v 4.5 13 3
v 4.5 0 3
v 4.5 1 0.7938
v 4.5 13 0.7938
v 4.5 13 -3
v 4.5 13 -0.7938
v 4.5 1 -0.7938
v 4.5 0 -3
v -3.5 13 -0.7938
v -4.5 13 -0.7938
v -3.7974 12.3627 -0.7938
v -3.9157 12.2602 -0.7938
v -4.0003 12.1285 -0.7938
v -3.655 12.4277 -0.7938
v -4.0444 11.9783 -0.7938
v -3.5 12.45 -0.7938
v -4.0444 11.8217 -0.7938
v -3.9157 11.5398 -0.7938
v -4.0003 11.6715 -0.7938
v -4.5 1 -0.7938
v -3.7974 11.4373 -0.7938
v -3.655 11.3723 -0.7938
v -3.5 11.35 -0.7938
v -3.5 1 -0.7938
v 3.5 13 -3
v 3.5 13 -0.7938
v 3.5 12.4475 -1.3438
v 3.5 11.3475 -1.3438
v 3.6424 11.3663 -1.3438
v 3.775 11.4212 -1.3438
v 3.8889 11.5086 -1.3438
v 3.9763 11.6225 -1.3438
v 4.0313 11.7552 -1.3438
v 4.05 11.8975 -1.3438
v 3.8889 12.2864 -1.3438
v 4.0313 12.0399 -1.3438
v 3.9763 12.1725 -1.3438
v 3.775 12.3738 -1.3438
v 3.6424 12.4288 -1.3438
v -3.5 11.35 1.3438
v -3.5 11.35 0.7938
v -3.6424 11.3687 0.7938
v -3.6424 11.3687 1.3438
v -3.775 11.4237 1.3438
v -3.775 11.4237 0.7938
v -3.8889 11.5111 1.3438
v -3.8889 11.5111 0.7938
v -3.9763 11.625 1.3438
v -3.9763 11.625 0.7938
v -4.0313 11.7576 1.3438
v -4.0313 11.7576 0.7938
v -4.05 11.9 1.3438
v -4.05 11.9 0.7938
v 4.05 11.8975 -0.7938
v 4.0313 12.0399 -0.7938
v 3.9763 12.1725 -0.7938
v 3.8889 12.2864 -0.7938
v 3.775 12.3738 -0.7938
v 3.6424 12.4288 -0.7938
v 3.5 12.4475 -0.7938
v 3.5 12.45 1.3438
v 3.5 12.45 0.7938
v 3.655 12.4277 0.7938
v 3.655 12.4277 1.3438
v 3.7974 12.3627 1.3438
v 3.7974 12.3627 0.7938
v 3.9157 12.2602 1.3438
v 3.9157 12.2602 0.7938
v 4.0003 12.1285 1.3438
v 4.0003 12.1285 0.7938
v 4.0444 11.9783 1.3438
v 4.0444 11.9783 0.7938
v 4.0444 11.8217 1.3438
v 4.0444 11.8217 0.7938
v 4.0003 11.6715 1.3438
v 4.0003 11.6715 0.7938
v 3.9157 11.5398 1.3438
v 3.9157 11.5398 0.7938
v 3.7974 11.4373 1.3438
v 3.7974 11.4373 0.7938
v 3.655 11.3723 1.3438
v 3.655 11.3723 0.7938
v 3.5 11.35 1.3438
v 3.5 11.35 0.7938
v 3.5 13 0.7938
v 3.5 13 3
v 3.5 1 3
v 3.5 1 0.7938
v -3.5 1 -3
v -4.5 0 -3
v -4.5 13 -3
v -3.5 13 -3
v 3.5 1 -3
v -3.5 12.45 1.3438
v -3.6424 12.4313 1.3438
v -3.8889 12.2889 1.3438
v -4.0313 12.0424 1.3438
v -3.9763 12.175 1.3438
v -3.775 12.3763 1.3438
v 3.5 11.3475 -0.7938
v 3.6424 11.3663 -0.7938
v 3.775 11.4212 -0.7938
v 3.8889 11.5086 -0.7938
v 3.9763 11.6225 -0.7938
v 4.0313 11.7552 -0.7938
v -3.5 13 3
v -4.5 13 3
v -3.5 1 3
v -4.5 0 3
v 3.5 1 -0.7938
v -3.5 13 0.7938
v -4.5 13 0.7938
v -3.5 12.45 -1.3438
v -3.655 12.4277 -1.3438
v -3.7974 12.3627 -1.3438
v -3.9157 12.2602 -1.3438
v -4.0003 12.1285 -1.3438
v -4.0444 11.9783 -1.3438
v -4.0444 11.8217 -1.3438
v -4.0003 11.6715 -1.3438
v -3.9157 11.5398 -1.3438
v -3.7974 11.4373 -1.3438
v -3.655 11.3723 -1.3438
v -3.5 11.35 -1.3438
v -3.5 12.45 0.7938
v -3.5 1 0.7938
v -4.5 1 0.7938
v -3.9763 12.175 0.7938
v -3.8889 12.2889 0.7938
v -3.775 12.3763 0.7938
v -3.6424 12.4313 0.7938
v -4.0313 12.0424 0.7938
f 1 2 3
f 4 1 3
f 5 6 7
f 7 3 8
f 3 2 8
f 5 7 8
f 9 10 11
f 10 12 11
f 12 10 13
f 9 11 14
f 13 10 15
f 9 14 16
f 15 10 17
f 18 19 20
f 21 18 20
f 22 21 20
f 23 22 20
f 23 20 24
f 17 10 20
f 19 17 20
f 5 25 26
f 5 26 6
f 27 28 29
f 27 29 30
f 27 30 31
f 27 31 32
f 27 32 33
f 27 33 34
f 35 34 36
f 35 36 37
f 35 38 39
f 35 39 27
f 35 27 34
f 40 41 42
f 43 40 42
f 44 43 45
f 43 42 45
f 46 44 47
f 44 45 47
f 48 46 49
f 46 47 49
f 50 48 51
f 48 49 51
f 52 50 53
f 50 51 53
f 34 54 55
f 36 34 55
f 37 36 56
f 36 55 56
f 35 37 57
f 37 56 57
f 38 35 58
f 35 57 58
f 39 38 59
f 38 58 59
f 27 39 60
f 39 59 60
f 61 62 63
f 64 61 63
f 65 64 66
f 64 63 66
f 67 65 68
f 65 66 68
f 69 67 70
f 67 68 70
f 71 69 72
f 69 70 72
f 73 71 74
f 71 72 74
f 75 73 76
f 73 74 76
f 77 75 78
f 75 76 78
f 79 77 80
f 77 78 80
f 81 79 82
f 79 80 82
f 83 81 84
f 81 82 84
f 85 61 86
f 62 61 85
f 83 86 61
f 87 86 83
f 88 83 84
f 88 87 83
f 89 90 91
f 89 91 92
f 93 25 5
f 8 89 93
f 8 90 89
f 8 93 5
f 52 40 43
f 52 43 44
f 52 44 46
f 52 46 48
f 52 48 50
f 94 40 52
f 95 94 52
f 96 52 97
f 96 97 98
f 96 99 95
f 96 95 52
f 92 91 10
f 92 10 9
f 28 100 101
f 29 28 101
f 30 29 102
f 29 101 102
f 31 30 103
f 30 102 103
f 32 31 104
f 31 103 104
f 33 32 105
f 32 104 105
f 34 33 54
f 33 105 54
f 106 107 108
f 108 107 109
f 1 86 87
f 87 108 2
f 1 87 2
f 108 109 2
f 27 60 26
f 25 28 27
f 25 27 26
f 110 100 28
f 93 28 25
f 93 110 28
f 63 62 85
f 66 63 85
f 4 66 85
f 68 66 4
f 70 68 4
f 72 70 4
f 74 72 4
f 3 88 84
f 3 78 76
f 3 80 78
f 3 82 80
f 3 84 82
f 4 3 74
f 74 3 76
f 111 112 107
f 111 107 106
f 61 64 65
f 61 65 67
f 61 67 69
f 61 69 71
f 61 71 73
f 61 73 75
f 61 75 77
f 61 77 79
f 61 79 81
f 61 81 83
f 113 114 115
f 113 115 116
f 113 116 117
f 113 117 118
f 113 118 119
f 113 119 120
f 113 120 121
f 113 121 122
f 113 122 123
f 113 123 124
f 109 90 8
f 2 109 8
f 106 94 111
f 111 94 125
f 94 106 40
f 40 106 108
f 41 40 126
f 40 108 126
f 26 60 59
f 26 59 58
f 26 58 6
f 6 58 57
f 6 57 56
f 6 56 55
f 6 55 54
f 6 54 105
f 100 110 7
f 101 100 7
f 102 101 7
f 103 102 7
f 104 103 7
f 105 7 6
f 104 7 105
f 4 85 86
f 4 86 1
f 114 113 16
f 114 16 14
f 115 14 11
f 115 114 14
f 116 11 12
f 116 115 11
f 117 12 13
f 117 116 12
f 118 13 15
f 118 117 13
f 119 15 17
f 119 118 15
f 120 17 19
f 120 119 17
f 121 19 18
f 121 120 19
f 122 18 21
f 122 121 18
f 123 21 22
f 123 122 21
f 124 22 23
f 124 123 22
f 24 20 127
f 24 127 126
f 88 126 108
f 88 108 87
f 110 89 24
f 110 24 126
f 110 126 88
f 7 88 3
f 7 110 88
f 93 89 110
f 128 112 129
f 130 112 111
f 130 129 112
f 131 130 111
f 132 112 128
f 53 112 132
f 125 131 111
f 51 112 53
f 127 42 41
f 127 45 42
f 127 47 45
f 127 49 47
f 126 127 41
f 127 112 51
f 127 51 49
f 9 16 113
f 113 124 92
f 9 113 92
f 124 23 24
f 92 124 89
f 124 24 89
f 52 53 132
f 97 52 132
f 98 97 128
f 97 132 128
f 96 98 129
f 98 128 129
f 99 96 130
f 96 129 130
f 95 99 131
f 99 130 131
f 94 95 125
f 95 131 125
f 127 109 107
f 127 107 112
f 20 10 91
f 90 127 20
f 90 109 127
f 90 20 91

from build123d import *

# Parameters (mm, degrees)
SKETCH_1_W          = 9
SKETCH_1_H          = 6
EXTRUDE_1_DEPTH     = 1
SKETCH_2_W          = 1
SKETCH_2_H          = 2.206197562
EXTRUDE_2_DEPTH     = 12
CUT_EXTRUDE_1_DEPTH = 0.55
CUT_EXTRUDE_2_DEPTH = 0.55
CUT_EXTRUDE_3_DEPTH = 0.55
CUT_EXTRUDE_START   = -0.55
CUT_EXTRUDE_4_DEPTH = 0.55


with BuildPart() as part:
    # 草圖1 → 填料-伸長1 (new body)
    with BuildSketch(Plane(origin=(0, 0, 0), x_dir=(1, 0, 0), z_dir=(0, 1, 0))):
        Rectangle(SKETCH_1_W, SKETCH_1_H)
    extrude(amount=EXTRUDE_1_DEPTH)

    # 草圖2 → 填料-伸長2 (add)
    with BuildSketch(Plane(origin=(0, 1, 0), x_dir=(1, 0, 0), z_dir=(0, 1, 0))):
        with Locations((-4, 1.896901219)):
            Rectangle(SKETCH_2_W, SKETCH_2_H)
        with Locations((-4, -1.896901219)):
            Rectangle(SKETCH_2_W, SKETCH_2_H)
        with Locations((4, -1.896901219)):
            Rectangle(SKETCH_2_W, SKETCH_2_H)
        with Locations((4, 1.896901219)):
            Rectangle(SKETCH_2_W, SKETCH_2_H)
    extrude(amount=EXTRUDE_2_DEPTH)

    # 草圖4 → 除料-伸長1 (cut)
    with BuildSketch(Plane.XY.offset(-0.793802438)):
        with BuildLine():
            ThreePointArc((4.05, 11.897519797), (3.88890873, 12.286428527), (3.5, 12.447519797))
            Line((3.5, 12.447519797), (3.5, 11.897519797))
            Line((3.5, 11.897519797), (3.5, 11.347519797))
            ThreePointArc((3.5, 11.347519797), (3.88890873, 11.508611068), (4.05, 11.897519797))
        make_face()
        with BuildLine():
            Line((3.5, 11.897519797), (3.5, 12.447519797))
            ThreePointArc((3.5, 12.447519797), (2.95, 11.897519797), (3.5, 11.347519797))
            Line((3.5, 11.347519797), (3.5, 11.897519797))
        make_face()
    extrude(amount=-CUT_EXTRUDE_1_DEPTH, mode=Mode.SUBTRACT)

    # 草圖6 → 除料-伸長2 (cut)
    with BuildSketch(Plane(origin=(0, 0, 0.793802438), x_dir=(-1, 0, 0), z_dir=(0, 0, -1))):
        with BuildLine():
            ThreePointArc((-2.95, 11.9), (-3.11109127, 12.28890873), (-3.5, 12.45))
            Line((-3.5, 12.45), (-3.5, 11.9))
            Line((-3.5, 11.9), (-3.5, 11.35))
            ThreePointArc((-3.5, 11.35), (-3.11109127, 11.51109127), (-2.95, 11.9))
        make_face()
        with BuildLine():
            Line((-3.5, 11.9), (-3.5, 12.45))
            ThreePointArc((-3.5, 12.45), (-4.05, 11.9), (-3.5, 11.35))
            Line((-3.5, 11.35), (-3.5, 11.9))
        make_face()
    extrude(amount=-CUT_EXTRUDE_2_DEPTH, mode=Mode.SUBTRACT)

    # 草圖7 → 除料-伸長3 (cut)
    with BuildSketch(Plane(origin=(0, 0, 0.793802438), x_dir=(-1, 0, 0), z_dir=(0, 0, -1))):
        with BuildLine():
            ThreePointArc((4.05, 11.9), (3.88890873, 12.28890873), (3.5, 12.45))
            Line((3.5, 12.45), (3.5, 11.9))
            Line((3.5, 11.9), (3.5, 11.35))
            ThreePointArc((3.5, 11.35), (3.88890873, 11.51109127), (4.05, 11.9))
        make_face()
        with BuildLine():
            Line((3.5, 11.9), (3.5, 12.45))
            ThreePointArc((3.5, 12.45), (2.95, 11.9), (3.5, 11.35))
            Line((3.5, 11.35), (3.5, 11.9))
        make_face()
    extrude(amount=-CUT_EXTRUDE_3_DEPTH, mode=Mode.SUBTRACT)

    # 草圖8 → 除料-伸長4 (cut)
    with BuildSketch(Plane.XY.offset(-0.793802438).offset(CUT_EXTRUDE_START)):
        with BuildLine():
            ThreePointArc((-2.95, 11.9), (-3.11109127, 12.28890873), (-3.5, 12.45))
            Line((-3.5, 12.45), (-3.5, 11.9))
            Line((-3.5, 11.9), (-3.5, 11.35))
            ThreePointArc((-3.5, 11.35), (-3.11109127, 11.51109127), (-2.95, 11.9))
        make_face()
        with BuildLine():
            Line((-3.5, 11.9), (-3.5, 12.45))
            ThreePointArc((-3.5, 12.45), (-4.05, 11.9), (-3.5, 11.35))
            Line((-3.5, 11.35), (-3.5, 11.9))
        make_face()
    extrude(amount=CUT_EXTRUDE_4_DEPTH, mode=Mode.SUBTRACT)


solid = part.part
